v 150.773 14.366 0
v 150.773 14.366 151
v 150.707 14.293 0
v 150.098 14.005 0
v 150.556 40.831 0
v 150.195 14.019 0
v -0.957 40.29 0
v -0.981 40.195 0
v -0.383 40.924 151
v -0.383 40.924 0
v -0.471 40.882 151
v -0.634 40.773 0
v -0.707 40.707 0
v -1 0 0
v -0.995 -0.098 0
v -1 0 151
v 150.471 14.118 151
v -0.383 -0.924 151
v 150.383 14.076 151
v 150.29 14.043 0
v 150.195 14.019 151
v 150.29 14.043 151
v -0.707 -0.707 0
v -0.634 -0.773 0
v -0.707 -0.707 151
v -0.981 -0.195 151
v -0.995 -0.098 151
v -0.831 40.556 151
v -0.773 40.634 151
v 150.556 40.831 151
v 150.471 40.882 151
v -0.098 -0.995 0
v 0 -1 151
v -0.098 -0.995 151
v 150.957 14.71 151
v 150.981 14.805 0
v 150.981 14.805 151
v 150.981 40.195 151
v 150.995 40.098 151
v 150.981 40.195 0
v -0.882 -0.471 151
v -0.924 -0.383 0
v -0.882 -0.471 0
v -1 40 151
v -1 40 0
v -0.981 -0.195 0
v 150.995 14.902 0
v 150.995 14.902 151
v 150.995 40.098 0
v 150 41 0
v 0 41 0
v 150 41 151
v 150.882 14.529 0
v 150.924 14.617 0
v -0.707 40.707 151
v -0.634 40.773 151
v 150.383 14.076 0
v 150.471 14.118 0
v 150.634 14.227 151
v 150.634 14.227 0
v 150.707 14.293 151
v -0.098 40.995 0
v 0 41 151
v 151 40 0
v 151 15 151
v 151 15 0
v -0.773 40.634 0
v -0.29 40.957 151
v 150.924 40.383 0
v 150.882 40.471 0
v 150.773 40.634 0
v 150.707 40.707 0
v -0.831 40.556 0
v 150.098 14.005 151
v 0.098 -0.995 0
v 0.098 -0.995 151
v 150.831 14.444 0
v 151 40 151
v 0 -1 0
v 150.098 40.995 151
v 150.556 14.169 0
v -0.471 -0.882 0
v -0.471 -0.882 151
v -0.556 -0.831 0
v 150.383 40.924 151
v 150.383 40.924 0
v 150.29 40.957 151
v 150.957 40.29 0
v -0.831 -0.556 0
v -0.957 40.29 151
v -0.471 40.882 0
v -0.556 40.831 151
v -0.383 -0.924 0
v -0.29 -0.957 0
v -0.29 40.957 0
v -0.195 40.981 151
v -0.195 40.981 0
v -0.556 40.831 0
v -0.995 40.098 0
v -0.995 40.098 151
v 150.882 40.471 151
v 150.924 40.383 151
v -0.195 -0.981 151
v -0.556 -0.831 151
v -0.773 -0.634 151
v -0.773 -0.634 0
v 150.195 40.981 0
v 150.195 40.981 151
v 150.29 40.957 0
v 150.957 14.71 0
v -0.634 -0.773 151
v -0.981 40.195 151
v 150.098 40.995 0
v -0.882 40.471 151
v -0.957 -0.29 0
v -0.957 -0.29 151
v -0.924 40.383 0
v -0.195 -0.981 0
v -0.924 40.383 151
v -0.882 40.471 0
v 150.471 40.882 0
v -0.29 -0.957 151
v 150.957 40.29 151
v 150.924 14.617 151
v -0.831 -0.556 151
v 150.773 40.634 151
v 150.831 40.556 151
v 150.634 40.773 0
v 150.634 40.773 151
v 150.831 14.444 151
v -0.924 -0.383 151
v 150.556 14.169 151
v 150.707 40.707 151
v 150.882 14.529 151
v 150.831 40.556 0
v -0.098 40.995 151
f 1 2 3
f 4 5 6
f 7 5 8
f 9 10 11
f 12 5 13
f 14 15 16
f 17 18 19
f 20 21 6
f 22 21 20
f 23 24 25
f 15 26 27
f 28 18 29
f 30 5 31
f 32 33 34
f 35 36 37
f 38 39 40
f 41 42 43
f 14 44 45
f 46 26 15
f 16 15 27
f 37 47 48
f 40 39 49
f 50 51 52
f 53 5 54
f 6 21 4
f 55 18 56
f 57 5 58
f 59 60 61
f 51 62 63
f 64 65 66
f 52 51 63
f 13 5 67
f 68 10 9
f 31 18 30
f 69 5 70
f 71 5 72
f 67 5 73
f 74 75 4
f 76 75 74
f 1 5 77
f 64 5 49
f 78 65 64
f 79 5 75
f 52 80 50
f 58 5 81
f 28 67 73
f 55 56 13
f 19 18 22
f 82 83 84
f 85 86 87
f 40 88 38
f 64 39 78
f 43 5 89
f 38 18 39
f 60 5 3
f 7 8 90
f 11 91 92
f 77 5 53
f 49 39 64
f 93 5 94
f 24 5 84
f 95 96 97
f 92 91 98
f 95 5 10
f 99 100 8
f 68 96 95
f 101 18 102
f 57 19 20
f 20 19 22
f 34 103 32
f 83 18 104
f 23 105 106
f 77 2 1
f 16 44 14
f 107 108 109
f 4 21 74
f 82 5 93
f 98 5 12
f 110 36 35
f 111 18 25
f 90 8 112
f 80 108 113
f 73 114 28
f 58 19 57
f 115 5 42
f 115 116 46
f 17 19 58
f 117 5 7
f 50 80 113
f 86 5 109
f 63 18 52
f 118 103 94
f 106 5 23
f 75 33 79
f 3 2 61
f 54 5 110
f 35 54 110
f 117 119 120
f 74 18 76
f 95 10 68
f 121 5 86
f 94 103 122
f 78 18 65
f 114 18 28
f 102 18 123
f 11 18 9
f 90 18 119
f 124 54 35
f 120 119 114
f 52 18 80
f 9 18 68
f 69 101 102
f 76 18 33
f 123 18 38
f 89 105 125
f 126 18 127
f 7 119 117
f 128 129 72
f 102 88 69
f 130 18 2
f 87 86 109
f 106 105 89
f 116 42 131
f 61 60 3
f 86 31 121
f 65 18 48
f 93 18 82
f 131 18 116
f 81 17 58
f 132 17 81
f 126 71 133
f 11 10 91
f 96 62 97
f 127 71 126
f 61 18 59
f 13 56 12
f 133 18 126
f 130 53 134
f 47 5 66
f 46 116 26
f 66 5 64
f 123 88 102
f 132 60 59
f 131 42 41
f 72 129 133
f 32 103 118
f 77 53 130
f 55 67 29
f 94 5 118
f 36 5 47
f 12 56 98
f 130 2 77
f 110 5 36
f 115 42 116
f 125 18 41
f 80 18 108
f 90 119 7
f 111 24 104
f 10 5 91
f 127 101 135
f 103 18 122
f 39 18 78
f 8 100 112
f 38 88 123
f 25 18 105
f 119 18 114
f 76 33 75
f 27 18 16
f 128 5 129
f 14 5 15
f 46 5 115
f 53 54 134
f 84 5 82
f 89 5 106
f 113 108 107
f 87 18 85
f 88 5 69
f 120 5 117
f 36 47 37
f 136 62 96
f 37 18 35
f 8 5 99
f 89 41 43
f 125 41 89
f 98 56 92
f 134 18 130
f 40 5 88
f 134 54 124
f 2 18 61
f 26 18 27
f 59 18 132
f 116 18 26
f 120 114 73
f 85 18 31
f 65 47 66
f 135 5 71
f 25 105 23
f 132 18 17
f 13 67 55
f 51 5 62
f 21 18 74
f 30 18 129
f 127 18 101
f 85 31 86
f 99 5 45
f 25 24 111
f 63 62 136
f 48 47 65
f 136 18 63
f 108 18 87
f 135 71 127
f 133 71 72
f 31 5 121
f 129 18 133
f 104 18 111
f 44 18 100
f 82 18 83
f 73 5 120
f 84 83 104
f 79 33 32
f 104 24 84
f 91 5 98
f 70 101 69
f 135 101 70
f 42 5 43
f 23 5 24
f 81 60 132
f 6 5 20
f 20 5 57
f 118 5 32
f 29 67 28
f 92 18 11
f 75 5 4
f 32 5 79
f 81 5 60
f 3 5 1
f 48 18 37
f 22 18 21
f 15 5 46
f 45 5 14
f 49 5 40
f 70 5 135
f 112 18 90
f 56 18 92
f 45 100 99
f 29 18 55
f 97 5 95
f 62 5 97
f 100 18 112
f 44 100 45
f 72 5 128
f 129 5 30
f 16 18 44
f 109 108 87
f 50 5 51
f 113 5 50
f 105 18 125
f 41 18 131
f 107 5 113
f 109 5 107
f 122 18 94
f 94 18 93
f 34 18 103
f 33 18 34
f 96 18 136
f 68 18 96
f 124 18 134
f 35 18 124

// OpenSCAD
// arm rest for the desk
// 20.09.2025 Sebastian Weigl
 
// set the fregment sizes
$fn = $preview ? 48 : 64;

minkowski(){
 linear_extrude(height=1, scale=[1,1], slices=0, twist=0)
 polygon(points=[[0,0],[0,40],[150,40],[150,15],[0,0]]);
 

  cylinder(h=150,r=1,center=false);

}
